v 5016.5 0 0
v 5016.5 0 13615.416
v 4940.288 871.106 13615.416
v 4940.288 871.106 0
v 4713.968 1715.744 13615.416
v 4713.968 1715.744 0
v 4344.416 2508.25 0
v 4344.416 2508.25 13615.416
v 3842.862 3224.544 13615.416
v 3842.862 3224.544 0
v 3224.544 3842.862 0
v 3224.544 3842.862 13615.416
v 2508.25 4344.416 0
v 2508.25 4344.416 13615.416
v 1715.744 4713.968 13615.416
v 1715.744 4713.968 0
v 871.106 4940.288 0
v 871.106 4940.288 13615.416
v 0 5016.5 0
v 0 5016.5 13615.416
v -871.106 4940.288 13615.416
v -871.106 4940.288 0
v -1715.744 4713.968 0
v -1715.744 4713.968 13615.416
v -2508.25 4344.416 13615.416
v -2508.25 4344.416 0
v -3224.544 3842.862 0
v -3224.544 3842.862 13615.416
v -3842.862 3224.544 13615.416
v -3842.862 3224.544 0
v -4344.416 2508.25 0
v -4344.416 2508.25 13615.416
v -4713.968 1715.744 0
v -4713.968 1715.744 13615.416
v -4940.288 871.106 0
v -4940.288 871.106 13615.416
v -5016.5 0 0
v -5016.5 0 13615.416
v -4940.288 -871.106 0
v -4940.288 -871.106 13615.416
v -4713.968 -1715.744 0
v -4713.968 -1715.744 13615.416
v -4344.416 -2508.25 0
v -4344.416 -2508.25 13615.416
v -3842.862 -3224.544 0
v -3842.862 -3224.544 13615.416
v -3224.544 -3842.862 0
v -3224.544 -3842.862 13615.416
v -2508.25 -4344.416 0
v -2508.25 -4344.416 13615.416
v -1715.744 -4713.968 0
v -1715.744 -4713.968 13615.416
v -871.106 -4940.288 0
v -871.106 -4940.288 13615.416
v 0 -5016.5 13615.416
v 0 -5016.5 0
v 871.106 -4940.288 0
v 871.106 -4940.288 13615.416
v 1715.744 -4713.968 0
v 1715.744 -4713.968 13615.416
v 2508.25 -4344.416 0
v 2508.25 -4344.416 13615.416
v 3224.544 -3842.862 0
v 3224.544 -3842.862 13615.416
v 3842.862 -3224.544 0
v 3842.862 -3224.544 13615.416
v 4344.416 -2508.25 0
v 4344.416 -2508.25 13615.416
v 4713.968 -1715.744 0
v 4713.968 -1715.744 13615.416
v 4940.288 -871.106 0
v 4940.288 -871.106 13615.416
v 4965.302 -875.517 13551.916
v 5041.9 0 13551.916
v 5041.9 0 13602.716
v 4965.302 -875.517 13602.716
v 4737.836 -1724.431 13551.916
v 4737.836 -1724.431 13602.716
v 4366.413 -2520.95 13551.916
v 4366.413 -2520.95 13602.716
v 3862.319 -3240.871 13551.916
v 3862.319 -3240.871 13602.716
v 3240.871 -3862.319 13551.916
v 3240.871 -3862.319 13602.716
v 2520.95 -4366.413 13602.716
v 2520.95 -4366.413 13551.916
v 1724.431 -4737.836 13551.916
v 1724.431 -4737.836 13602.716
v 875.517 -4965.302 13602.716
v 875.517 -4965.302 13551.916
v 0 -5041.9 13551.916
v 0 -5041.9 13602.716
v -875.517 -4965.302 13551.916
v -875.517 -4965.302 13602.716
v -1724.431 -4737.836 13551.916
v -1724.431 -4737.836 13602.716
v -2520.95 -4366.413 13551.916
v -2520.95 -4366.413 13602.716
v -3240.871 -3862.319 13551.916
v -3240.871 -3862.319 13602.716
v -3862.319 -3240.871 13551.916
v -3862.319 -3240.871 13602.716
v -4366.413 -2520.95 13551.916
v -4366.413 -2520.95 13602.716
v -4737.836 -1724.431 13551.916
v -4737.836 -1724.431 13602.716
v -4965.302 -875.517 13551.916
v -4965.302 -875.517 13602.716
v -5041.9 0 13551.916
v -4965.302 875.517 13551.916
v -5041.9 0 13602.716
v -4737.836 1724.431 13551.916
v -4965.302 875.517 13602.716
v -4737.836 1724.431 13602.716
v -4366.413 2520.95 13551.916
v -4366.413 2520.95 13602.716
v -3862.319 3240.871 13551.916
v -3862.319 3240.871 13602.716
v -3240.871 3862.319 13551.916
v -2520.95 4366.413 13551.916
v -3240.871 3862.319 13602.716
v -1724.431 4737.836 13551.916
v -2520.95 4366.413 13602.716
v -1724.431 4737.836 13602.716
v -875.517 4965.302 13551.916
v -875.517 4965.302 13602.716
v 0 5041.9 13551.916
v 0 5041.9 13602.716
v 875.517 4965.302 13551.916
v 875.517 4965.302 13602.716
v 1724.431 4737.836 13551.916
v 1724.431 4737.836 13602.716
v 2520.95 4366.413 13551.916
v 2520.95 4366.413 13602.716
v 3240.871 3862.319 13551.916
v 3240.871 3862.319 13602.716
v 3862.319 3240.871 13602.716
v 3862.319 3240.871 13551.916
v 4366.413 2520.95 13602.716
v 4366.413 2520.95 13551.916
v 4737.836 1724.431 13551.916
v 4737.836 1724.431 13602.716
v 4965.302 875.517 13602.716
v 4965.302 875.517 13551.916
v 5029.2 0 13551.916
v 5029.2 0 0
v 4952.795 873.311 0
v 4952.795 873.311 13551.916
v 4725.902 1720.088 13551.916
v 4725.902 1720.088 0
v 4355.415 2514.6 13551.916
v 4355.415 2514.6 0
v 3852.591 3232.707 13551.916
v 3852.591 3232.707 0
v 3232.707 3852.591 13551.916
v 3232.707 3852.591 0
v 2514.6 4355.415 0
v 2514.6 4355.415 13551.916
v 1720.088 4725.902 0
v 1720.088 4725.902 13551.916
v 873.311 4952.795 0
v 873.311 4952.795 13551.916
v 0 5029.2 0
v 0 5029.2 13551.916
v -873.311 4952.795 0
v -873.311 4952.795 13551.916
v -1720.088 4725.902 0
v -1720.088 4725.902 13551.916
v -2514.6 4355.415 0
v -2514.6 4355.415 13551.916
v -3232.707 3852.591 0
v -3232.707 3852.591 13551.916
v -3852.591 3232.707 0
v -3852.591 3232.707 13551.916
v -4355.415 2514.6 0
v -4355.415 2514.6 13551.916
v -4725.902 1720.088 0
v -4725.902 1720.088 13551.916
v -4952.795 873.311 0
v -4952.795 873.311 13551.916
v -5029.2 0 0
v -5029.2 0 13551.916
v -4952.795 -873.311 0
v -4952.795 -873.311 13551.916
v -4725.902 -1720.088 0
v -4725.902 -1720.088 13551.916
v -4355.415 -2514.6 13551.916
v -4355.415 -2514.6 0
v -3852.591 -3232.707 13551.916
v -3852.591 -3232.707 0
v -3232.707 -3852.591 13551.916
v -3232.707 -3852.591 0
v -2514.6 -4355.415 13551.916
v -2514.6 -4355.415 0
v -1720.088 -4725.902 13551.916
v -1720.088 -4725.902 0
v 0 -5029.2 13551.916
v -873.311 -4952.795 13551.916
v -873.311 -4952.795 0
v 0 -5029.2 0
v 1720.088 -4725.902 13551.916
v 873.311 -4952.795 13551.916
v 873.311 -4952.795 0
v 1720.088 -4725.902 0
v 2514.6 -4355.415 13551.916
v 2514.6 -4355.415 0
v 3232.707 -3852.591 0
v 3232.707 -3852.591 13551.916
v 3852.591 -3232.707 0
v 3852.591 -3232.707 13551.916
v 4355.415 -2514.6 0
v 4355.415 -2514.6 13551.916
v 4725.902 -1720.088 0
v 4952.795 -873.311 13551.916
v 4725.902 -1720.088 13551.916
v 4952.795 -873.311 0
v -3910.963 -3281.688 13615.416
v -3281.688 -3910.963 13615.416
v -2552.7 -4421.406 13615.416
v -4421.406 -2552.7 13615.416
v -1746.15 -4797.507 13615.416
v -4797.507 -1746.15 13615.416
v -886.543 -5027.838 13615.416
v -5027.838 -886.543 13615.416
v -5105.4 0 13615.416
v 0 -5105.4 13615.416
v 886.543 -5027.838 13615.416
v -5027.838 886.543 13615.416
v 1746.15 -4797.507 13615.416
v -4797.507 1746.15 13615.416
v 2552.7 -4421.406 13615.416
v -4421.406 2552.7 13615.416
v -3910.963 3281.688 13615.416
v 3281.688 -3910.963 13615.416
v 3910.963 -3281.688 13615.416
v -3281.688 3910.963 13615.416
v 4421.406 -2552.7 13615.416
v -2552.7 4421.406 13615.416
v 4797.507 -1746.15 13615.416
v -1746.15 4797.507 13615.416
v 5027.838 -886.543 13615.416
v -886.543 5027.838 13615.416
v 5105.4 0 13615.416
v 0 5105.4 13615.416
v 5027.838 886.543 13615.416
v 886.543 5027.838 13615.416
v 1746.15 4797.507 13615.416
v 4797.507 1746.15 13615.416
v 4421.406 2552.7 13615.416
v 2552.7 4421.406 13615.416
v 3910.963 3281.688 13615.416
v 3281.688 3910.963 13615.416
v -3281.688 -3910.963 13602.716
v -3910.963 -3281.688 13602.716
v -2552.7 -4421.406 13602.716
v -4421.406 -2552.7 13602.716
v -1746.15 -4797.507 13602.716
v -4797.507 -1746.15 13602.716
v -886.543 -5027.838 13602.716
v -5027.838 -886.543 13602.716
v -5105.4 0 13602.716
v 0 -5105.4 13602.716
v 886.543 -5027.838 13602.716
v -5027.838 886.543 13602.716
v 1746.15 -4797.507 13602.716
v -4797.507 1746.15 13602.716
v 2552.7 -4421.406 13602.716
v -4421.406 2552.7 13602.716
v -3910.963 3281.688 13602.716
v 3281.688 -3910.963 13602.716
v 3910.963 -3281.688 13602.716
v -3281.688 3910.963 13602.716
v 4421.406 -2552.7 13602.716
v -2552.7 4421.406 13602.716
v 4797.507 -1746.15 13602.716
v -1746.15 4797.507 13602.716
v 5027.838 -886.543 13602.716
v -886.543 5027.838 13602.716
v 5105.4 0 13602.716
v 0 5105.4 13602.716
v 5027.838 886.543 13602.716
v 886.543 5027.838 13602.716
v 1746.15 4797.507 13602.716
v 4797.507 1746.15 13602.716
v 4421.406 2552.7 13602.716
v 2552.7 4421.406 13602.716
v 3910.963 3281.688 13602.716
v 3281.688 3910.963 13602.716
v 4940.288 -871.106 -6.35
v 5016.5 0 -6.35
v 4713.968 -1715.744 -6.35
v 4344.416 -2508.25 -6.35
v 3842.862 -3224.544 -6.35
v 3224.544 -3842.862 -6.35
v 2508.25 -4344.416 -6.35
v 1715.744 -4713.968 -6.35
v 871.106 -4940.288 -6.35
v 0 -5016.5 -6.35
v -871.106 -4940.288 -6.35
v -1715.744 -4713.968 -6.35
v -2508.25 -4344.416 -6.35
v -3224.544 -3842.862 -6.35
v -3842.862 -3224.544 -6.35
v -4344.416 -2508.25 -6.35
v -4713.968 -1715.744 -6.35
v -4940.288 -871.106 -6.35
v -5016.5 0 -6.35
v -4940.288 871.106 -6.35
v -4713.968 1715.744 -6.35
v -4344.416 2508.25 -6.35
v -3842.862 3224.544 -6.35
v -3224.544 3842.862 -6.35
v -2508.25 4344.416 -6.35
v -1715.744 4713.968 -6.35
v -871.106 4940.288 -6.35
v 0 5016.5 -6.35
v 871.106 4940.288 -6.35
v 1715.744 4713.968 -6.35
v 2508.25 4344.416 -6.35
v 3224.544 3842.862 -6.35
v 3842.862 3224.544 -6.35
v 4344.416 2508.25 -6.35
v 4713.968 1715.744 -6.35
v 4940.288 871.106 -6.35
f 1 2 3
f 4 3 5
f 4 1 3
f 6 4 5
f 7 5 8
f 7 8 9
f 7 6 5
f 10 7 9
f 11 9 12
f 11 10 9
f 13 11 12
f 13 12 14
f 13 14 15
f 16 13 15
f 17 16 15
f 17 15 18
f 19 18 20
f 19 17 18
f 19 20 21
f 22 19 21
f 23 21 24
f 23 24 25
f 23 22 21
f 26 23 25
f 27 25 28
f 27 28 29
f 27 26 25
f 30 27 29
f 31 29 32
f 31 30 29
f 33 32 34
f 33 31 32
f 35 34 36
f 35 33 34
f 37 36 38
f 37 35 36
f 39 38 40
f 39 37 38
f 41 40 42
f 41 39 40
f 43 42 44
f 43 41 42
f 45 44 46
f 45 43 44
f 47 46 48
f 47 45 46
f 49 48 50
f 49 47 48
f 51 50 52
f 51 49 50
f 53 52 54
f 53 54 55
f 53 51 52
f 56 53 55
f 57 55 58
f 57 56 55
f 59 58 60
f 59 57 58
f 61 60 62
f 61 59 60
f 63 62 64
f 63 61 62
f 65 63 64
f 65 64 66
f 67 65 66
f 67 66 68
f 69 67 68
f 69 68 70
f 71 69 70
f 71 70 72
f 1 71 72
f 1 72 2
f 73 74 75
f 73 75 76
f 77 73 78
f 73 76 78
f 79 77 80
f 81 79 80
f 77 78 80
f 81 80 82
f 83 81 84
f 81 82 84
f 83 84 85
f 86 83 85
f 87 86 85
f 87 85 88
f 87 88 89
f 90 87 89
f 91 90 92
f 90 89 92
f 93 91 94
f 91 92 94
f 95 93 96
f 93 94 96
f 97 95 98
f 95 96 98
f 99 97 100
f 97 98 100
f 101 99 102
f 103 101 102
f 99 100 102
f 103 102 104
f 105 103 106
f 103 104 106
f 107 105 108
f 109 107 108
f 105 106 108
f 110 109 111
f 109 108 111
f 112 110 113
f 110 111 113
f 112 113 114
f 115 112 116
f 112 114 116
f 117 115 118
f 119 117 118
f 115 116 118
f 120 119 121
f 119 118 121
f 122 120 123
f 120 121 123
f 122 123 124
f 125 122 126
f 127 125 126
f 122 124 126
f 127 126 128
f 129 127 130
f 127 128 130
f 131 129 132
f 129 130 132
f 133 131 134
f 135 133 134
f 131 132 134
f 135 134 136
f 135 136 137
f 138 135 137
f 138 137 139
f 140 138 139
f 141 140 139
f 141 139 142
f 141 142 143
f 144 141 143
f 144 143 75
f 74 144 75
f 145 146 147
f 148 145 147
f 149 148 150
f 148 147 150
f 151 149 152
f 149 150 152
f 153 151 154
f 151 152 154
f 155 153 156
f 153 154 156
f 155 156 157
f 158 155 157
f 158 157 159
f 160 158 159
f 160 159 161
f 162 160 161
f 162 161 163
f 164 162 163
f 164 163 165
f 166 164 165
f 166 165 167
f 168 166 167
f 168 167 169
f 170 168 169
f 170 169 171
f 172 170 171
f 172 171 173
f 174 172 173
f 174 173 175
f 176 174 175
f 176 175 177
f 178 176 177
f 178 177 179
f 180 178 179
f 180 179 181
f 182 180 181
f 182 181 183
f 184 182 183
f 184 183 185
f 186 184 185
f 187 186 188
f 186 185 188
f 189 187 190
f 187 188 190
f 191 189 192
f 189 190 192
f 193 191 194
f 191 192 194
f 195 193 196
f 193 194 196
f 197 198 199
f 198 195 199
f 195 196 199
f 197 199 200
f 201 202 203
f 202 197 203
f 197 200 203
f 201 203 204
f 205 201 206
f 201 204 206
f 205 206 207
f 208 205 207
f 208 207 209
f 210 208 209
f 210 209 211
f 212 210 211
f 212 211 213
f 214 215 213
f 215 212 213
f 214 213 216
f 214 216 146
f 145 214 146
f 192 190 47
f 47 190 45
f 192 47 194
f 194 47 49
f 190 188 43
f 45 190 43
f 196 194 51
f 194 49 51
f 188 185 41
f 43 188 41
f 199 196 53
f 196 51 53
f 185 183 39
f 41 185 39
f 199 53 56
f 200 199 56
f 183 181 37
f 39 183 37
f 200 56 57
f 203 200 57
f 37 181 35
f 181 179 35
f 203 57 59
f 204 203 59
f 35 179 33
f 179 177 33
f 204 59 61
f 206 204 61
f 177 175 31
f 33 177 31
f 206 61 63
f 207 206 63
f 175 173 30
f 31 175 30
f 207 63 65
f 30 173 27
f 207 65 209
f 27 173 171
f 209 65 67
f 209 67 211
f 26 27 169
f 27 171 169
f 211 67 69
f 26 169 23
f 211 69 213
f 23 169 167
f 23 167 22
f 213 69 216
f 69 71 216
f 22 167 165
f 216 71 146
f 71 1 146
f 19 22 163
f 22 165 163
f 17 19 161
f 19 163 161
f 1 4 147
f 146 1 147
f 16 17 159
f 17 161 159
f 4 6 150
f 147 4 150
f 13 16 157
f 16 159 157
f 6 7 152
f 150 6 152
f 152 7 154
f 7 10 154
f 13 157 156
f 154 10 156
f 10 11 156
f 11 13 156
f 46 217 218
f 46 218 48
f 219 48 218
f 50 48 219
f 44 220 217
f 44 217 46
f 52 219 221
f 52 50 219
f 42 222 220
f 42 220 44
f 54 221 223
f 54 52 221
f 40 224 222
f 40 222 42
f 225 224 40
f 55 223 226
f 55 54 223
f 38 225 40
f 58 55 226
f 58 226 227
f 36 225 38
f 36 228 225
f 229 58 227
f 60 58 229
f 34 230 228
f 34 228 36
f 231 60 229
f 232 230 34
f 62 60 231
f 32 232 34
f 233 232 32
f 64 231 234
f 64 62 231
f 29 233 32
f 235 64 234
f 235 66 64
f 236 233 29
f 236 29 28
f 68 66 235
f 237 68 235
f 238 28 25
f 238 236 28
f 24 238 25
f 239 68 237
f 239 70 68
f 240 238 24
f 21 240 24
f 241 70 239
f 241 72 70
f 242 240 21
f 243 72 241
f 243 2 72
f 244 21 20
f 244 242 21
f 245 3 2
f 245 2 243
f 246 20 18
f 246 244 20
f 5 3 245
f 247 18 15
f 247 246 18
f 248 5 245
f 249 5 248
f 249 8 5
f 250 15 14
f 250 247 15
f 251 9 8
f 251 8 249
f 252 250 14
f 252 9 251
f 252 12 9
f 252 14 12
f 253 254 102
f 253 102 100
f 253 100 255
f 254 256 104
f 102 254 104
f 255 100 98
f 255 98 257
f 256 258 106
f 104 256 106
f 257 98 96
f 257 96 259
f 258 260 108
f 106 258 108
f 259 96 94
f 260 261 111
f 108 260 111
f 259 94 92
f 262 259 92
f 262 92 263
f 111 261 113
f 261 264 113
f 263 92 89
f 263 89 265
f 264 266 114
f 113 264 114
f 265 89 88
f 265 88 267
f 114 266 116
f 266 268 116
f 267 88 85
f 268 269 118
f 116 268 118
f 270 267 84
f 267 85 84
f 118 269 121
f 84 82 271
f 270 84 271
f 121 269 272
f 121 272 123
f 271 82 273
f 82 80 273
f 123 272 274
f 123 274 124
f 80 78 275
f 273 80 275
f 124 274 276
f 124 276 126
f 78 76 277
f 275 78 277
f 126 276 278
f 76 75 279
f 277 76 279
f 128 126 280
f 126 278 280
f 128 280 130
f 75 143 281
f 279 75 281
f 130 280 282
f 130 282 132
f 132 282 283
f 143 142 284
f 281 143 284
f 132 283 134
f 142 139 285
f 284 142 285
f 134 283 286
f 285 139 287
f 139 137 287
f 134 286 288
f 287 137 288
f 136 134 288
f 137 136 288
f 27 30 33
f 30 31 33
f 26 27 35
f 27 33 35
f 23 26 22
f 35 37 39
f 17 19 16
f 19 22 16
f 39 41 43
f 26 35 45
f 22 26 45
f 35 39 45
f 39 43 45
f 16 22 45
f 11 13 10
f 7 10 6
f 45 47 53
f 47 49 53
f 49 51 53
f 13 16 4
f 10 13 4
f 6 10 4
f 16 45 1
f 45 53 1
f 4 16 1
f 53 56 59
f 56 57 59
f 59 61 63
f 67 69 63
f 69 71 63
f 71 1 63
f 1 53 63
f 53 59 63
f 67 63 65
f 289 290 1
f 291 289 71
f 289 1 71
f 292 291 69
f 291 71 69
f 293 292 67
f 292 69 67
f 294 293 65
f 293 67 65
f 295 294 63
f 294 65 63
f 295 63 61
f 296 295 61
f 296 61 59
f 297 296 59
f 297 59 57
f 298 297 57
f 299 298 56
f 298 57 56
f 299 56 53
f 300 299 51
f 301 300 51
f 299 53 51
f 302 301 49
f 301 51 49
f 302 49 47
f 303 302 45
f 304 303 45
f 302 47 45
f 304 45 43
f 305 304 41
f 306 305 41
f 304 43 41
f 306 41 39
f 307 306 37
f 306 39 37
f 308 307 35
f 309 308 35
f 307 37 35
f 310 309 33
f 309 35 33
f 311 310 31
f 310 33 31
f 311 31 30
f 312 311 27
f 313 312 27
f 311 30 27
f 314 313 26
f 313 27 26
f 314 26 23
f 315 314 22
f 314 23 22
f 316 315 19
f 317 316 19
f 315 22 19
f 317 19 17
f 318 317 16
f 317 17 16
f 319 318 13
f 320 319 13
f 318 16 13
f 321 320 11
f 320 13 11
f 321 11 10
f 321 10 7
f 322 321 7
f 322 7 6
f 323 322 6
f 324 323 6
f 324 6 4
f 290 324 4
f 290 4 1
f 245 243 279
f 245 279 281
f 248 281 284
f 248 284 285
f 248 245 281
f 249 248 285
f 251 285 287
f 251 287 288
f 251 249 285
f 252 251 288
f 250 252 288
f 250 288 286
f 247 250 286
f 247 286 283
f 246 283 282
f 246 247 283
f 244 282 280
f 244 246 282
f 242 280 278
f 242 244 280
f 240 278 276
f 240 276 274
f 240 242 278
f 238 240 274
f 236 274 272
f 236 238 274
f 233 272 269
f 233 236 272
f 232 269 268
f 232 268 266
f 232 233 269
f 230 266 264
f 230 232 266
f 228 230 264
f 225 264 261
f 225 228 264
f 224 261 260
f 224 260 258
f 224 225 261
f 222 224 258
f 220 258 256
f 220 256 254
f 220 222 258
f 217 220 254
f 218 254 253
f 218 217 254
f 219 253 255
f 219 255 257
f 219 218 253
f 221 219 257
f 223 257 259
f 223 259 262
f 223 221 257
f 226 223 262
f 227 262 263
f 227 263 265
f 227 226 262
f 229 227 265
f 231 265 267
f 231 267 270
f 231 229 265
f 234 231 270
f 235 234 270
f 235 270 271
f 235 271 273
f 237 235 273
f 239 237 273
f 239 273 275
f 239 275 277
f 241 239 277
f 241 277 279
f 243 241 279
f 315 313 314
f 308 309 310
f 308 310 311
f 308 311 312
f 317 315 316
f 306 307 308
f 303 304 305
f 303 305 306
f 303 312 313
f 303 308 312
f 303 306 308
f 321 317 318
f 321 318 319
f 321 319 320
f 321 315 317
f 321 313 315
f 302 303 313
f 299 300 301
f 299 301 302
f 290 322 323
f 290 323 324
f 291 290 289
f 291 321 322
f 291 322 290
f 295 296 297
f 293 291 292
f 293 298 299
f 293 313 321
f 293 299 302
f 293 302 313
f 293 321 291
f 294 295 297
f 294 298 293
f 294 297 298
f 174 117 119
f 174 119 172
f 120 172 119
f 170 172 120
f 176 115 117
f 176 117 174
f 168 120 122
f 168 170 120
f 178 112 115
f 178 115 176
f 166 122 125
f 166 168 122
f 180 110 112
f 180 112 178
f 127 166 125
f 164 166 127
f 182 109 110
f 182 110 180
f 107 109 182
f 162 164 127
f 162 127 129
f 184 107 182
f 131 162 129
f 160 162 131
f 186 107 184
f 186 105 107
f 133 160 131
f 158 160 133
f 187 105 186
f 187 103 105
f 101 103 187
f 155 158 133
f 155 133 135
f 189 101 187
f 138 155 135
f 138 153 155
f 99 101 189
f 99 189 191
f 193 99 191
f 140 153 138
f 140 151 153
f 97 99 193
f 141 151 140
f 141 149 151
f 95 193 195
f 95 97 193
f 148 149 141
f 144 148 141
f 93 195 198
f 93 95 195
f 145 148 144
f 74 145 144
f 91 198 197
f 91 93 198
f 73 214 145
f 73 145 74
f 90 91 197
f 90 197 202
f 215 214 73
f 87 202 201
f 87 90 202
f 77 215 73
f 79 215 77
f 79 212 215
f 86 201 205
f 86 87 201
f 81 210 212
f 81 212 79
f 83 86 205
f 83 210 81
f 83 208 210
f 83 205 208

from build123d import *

# Parameters (mm, degrees)
F0_R     = 5029.2
F0_R_2   = 5016.5
F1_DEPTH = 13615.416
F2_R     = 5016.5
F3_DEPTH = 6.35
F4_R     = 5105.4
F4_R_2   = 5029.2
F5_DEPTH = 12.7
F6_R     = 5041.9
F6_R_2   = 5029.2
F7_DEPTH = 50.8


with BuildPart() as f1:
    # F0 (on Top) → F1 (new body)
    with BuildSketch(Plane.XY):
        Circle(F0_R)
        Circle(F0_R_2, mode=Mode.SUBTRACT)
    extrude(amount=F1_DEPTH)

    # F4 (on face) → F5 (join)
    with BuildSketch(Plane.XY.offset(13615.416)):
        Circle(F4_R)
        Circle(F4_R_2, mode=Mode.SUBTRACT)
    extrude(amount=-F5_DEPTH)

    # F6 (on face) → F7 (join)
    with BuildSketch(Plane(origin=(0, 0, 13602.716), x_dir=(1, 0, 0), z_dir=(0, 0, -1))):
        Circle(F6_R)
        Circle(F6_R_2, mode=Mode.SUBTRACT)
    extrude(amount=F7_DEPTH)


with BuildPart() as f3:
    # F2 (on face) → F3 (new body)
    with BuildSketch(Plane(origin=(0, 0, 0), x_dir=(1, 0, 0), z_dir=(0, 0, -1))):
        Circle(F2_R)
    extrude(amount=F3_DEPTH)


with BuildPart() as f1_1:
    add(f1.part)

    # F8: union F3
    add(f3.part)


solid = f1_1.part
